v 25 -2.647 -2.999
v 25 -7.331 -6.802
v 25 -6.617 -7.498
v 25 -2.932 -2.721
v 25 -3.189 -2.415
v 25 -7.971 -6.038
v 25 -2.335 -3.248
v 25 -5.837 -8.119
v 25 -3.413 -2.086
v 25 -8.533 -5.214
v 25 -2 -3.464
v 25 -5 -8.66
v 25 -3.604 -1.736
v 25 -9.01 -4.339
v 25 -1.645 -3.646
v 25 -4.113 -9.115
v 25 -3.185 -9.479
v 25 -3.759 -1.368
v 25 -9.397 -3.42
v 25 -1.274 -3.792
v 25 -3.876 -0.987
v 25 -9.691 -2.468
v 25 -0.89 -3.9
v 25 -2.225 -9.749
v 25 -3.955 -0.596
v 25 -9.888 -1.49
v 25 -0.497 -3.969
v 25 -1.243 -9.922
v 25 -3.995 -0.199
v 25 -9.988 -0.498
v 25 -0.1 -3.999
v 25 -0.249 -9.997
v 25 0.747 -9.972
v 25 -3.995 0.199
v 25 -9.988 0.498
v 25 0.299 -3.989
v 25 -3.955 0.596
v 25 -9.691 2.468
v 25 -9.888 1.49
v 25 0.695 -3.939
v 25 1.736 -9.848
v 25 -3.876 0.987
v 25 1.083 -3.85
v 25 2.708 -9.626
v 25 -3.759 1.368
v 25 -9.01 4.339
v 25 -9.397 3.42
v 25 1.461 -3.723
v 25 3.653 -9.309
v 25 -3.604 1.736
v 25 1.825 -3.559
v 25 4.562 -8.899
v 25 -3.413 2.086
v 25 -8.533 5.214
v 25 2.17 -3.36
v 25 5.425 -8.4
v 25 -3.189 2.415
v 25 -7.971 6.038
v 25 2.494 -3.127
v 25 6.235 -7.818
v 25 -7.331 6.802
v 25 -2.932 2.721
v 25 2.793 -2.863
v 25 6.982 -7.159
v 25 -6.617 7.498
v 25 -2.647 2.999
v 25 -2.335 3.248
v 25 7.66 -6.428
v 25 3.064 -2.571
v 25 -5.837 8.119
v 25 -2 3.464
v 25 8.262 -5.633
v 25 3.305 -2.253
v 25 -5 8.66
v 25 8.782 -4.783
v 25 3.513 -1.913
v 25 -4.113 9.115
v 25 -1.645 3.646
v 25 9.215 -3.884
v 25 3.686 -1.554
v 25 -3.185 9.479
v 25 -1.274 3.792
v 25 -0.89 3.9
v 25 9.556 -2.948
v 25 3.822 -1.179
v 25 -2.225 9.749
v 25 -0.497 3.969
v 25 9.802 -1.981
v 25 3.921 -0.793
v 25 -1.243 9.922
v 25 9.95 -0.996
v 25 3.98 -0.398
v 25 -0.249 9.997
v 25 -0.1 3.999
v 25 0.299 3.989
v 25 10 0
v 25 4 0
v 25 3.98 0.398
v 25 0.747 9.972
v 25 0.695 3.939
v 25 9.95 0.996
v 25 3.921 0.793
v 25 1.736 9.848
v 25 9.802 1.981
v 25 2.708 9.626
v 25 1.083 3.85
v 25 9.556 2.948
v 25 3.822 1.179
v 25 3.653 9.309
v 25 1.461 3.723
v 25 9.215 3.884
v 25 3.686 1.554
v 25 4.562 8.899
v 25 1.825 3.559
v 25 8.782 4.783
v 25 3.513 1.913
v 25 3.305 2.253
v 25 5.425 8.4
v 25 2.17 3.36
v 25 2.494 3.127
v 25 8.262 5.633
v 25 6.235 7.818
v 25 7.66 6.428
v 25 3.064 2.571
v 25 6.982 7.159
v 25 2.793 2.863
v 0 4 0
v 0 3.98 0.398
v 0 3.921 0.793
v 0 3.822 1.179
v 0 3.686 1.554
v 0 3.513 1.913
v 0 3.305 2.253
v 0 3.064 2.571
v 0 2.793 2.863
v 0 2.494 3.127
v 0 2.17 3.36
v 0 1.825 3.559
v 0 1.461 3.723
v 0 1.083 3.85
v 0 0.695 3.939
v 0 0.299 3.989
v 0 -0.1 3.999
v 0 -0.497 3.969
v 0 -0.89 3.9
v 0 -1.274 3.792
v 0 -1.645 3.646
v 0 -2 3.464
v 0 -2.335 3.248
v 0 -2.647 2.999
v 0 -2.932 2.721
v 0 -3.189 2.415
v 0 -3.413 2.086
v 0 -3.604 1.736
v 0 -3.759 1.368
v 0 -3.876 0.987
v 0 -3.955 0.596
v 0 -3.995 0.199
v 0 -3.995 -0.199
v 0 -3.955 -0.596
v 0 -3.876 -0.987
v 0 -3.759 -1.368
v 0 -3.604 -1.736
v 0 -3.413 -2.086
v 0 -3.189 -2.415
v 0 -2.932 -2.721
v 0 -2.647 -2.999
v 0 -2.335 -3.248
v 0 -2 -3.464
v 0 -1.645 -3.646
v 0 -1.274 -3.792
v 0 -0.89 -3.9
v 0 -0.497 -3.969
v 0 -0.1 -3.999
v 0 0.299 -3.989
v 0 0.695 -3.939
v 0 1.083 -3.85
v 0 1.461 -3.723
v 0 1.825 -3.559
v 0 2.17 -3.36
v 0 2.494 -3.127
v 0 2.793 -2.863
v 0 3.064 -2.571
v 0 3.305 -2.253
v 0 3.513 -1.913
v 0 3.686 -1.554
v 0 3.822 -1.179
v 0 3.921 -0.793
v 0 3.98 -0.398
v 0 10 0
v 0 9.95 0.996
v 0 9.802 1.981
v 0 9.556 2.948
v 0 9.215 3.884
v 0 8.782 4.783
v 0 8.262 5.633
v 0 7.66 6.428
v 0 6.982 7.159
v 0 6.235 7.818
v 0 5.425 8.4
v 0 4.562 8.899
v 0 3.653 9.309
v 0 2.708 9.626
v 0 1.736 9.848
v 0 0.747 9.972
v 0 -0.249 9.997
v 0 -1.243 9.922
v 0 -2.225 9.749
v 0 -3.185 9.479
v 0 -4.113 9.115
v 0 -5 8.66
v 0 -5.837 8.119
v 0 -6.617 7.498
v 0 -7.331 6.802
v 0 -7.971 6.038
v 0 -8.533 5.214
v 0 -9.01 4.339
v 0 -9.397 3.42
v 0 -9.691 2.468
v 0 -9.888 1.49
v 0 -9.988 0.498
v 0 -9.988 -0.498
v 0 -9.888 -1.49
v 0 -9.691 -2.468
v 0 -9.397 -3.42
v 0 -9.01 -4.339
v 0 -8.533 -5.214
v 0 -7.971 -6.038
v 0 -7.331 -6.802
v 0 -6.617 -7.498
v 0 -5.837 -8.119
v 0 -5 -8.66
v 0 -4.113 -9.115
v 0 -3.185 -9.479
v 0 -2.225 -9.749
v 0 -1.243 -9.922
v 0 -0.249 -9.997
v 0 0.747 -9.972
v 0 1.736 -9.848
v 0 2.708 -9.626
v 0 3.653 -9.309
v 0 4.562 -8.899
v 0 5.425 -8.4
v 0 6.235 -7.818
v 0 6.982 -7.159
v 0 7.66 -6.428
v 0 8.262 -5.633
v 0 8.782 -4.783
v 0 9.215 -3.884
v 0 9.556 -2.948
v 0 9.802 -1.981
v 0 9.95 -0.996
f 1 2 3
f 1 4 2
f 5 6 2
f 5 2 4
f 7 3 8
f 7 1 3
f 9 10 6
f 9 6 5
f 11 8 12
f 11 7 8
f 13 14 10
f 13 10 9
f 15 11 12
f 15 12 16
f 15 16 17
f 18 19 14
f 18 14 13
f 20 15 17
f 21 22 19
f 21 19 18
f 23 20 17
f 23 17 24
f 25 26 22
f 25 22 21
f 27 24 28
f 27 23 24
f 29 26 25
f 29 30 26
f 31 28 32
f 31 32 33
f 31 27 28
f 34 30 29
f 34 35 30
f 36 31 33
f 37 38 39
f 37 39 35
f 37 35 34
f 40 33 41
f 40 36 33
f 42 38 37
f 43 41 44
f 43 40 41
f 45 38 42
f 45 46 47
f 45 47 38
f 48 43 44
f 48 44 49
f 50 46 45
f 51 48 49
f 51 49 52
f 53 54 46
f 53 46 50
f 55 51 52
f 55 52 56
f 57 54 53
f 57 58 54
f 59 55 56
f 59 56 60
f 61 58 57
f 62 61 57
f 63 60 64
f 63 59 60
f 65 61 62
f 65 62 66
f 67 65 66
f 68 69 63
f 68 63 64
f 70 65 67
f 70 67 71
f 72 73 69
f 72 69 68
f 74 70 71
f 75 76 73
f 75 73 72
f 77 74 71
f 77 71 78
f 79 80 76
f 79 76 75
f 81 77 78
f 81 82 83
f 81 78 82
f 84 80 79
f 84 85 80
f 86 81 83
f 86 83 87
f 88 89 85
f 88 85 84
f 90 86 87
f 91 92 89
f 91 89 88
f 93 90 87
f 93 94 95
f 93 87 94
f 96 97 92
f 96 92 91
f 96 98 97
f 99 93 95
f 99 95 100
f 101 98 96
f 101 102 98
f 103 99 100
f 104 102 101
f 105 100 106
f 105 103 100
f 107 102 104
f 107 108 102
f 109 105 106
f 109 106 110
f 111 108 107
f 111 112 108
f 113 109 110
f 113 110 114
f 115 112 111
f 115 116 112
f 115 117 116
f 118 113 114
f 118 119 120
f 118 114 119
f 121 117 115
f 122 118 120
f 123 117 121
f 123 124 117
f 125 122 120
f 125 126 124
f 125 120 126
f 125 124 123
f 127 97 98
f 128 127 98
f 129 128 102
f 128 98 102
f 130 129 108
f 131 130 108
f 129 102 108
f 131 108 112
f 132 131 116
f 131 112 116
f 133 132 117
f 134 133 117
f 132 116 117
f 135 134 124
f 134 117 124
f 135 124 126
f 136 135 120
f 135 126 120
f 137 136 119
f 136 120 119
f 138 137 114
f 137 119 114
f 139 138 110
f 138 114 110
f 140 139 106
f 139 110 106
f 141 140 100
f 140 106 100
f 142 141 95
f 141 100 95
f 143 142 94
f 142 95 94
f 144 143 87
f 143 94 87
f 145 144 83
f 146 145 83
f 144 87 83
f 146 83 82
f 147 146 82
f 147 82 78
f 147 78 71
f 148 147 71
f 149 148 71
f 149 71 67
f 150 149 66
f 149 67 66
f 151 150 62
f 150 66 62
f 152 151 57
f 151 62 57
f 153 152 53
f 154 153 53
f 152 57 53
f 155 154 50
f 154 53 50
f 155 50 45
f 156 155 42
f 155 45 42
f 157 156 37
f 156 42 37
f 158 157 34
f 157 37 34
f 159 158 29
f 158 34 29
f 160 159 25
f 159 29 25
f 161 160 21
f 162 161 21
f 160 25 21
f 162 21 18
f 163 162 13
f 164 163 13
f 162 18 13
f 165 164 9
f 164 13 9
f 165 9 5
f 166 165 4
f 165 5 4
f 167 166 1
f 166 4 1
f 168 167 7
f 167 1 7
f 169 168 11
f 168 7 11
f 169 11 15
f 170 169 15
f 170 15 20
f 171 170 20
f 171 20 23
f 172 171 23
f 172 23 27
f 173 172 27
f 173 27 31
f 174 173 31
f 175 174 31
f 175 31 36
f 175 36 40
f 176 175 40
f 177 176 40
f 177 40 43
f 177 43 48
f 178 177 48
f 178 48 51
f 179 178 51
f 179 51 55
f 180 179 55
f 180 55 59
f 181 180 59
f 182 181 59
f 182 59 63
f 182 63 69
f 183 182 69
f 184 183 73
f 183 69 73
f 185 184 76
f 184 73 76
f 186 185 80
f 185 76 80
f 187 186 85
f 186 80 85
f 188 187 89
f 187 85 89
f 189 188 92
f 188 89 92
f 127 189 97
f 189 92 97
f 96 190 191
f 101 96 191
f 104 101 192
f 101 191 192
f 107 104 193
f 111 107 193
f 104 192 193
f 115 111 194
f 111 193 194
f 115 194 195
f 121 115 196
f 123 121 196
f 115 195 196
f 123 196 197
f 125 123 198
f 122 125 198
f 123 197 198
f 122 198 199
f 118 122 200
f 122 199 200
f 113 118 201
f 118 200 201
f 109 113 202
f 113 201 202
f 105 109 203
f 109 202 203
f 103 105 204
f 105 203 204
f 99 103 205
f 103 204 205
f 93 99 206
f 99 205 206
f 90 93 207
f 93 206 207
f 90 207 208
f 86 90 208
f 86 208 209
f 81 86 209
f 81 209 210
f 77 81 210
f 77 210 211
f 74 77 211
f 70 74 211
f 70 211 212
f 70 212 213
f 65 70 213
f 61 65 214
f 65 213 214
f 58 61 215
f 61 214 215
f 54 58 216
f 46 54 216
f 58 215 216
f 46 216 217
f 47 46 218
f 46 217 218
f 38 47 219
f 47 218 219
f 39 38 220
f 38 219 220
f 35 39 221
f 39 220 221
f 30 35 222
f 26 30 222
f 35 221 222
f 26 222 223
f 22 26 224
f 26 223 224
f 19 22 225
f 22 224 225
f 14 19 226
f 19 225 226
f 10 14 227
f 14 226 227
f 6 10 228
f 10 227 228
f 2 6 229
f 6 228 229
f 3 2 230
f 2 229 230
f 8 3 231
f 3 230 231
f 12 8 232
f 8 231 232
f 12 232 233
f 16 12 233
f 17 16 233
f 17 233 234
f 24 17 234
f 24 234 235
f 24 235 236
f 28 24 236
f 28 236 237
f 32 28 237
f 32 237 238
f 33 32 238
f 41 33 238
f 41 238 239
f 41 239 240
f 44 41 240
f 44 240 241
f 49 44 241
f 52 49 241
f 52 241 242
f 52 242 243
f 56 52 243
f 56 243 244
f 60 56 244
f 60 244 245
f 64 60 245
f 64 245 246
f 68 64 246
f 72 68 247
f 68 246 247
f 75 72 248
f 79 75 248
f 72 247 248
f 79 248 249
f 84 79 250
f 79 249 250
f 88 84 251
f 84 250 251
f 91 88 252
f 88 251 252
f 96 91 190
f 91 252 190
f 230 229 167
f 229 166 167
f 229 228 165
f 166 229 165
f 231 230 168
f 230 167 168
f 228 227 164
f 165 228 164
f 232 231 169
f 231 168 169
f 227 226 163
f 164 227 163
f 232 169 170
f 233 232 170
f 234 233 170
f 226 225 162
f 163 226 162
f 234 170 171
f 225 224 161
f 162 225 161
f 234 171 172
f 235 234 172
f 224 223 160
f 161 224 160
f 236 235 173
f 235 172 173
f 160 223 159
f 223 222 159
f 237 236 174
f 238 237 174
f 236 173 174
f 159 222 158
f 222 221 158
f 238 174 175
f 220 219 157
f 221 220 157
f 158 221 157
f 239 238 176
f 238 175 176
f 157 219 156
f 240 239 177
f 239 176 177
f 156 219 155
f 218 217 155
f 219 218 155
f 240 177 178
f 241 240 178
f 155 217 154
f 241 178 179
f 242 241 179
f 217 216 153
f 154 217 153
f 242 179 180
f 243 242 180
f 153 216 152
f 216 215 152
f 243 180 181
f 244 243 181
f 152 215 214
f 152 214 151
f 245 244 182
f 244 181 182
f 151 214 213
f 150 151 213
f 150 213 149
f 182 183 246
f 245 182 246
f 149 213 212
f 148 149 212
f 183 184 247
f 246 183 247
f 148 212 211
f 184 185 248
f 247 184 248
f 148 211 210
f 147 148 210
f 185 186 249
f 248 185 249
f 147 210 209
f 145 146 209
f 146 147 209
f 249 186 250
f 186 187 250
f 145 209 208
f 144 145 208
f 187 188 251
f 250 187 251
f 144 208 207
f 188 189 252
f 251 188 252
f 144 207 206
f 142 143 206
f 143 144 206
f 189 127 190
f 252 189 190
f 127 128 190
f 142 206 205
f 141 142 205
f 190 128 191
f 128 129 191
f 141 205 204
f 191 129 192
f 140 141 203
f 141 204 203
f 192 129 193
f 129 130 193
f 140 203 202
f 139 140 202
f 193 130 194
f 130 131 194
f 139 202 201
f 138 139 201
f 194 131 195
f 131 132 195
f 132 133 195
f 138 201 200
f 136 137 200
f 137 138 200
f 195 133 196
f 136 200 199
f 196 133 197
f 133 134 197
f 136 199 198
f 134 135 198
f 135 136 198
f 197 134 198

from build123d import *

# Parameters (mm, degrees)
F0_R     = 10
F1_DEPTH = 25
F4_R     = 4
F5_DEPTH = 25


with BuildPart() as f1:
    # F0 (on Right) → F1 (new body)
    with BuildSketch(Plane.YZ):
        Circle(F0_R)
    extrude(amount=F1_DEPTH)


with BuildPart() as f2_1:
    # F2: copy of F1
    add(f1.part)

    # F4 (on face) → F5 (cut, through all)
    with BuildSketch(Plane.YZ.offset(25)):
        Circle(F4_R)
    extrude(amount=-F5_DEPTH, mode=Mode.SUBTRACT)


solid = f2_1.part
